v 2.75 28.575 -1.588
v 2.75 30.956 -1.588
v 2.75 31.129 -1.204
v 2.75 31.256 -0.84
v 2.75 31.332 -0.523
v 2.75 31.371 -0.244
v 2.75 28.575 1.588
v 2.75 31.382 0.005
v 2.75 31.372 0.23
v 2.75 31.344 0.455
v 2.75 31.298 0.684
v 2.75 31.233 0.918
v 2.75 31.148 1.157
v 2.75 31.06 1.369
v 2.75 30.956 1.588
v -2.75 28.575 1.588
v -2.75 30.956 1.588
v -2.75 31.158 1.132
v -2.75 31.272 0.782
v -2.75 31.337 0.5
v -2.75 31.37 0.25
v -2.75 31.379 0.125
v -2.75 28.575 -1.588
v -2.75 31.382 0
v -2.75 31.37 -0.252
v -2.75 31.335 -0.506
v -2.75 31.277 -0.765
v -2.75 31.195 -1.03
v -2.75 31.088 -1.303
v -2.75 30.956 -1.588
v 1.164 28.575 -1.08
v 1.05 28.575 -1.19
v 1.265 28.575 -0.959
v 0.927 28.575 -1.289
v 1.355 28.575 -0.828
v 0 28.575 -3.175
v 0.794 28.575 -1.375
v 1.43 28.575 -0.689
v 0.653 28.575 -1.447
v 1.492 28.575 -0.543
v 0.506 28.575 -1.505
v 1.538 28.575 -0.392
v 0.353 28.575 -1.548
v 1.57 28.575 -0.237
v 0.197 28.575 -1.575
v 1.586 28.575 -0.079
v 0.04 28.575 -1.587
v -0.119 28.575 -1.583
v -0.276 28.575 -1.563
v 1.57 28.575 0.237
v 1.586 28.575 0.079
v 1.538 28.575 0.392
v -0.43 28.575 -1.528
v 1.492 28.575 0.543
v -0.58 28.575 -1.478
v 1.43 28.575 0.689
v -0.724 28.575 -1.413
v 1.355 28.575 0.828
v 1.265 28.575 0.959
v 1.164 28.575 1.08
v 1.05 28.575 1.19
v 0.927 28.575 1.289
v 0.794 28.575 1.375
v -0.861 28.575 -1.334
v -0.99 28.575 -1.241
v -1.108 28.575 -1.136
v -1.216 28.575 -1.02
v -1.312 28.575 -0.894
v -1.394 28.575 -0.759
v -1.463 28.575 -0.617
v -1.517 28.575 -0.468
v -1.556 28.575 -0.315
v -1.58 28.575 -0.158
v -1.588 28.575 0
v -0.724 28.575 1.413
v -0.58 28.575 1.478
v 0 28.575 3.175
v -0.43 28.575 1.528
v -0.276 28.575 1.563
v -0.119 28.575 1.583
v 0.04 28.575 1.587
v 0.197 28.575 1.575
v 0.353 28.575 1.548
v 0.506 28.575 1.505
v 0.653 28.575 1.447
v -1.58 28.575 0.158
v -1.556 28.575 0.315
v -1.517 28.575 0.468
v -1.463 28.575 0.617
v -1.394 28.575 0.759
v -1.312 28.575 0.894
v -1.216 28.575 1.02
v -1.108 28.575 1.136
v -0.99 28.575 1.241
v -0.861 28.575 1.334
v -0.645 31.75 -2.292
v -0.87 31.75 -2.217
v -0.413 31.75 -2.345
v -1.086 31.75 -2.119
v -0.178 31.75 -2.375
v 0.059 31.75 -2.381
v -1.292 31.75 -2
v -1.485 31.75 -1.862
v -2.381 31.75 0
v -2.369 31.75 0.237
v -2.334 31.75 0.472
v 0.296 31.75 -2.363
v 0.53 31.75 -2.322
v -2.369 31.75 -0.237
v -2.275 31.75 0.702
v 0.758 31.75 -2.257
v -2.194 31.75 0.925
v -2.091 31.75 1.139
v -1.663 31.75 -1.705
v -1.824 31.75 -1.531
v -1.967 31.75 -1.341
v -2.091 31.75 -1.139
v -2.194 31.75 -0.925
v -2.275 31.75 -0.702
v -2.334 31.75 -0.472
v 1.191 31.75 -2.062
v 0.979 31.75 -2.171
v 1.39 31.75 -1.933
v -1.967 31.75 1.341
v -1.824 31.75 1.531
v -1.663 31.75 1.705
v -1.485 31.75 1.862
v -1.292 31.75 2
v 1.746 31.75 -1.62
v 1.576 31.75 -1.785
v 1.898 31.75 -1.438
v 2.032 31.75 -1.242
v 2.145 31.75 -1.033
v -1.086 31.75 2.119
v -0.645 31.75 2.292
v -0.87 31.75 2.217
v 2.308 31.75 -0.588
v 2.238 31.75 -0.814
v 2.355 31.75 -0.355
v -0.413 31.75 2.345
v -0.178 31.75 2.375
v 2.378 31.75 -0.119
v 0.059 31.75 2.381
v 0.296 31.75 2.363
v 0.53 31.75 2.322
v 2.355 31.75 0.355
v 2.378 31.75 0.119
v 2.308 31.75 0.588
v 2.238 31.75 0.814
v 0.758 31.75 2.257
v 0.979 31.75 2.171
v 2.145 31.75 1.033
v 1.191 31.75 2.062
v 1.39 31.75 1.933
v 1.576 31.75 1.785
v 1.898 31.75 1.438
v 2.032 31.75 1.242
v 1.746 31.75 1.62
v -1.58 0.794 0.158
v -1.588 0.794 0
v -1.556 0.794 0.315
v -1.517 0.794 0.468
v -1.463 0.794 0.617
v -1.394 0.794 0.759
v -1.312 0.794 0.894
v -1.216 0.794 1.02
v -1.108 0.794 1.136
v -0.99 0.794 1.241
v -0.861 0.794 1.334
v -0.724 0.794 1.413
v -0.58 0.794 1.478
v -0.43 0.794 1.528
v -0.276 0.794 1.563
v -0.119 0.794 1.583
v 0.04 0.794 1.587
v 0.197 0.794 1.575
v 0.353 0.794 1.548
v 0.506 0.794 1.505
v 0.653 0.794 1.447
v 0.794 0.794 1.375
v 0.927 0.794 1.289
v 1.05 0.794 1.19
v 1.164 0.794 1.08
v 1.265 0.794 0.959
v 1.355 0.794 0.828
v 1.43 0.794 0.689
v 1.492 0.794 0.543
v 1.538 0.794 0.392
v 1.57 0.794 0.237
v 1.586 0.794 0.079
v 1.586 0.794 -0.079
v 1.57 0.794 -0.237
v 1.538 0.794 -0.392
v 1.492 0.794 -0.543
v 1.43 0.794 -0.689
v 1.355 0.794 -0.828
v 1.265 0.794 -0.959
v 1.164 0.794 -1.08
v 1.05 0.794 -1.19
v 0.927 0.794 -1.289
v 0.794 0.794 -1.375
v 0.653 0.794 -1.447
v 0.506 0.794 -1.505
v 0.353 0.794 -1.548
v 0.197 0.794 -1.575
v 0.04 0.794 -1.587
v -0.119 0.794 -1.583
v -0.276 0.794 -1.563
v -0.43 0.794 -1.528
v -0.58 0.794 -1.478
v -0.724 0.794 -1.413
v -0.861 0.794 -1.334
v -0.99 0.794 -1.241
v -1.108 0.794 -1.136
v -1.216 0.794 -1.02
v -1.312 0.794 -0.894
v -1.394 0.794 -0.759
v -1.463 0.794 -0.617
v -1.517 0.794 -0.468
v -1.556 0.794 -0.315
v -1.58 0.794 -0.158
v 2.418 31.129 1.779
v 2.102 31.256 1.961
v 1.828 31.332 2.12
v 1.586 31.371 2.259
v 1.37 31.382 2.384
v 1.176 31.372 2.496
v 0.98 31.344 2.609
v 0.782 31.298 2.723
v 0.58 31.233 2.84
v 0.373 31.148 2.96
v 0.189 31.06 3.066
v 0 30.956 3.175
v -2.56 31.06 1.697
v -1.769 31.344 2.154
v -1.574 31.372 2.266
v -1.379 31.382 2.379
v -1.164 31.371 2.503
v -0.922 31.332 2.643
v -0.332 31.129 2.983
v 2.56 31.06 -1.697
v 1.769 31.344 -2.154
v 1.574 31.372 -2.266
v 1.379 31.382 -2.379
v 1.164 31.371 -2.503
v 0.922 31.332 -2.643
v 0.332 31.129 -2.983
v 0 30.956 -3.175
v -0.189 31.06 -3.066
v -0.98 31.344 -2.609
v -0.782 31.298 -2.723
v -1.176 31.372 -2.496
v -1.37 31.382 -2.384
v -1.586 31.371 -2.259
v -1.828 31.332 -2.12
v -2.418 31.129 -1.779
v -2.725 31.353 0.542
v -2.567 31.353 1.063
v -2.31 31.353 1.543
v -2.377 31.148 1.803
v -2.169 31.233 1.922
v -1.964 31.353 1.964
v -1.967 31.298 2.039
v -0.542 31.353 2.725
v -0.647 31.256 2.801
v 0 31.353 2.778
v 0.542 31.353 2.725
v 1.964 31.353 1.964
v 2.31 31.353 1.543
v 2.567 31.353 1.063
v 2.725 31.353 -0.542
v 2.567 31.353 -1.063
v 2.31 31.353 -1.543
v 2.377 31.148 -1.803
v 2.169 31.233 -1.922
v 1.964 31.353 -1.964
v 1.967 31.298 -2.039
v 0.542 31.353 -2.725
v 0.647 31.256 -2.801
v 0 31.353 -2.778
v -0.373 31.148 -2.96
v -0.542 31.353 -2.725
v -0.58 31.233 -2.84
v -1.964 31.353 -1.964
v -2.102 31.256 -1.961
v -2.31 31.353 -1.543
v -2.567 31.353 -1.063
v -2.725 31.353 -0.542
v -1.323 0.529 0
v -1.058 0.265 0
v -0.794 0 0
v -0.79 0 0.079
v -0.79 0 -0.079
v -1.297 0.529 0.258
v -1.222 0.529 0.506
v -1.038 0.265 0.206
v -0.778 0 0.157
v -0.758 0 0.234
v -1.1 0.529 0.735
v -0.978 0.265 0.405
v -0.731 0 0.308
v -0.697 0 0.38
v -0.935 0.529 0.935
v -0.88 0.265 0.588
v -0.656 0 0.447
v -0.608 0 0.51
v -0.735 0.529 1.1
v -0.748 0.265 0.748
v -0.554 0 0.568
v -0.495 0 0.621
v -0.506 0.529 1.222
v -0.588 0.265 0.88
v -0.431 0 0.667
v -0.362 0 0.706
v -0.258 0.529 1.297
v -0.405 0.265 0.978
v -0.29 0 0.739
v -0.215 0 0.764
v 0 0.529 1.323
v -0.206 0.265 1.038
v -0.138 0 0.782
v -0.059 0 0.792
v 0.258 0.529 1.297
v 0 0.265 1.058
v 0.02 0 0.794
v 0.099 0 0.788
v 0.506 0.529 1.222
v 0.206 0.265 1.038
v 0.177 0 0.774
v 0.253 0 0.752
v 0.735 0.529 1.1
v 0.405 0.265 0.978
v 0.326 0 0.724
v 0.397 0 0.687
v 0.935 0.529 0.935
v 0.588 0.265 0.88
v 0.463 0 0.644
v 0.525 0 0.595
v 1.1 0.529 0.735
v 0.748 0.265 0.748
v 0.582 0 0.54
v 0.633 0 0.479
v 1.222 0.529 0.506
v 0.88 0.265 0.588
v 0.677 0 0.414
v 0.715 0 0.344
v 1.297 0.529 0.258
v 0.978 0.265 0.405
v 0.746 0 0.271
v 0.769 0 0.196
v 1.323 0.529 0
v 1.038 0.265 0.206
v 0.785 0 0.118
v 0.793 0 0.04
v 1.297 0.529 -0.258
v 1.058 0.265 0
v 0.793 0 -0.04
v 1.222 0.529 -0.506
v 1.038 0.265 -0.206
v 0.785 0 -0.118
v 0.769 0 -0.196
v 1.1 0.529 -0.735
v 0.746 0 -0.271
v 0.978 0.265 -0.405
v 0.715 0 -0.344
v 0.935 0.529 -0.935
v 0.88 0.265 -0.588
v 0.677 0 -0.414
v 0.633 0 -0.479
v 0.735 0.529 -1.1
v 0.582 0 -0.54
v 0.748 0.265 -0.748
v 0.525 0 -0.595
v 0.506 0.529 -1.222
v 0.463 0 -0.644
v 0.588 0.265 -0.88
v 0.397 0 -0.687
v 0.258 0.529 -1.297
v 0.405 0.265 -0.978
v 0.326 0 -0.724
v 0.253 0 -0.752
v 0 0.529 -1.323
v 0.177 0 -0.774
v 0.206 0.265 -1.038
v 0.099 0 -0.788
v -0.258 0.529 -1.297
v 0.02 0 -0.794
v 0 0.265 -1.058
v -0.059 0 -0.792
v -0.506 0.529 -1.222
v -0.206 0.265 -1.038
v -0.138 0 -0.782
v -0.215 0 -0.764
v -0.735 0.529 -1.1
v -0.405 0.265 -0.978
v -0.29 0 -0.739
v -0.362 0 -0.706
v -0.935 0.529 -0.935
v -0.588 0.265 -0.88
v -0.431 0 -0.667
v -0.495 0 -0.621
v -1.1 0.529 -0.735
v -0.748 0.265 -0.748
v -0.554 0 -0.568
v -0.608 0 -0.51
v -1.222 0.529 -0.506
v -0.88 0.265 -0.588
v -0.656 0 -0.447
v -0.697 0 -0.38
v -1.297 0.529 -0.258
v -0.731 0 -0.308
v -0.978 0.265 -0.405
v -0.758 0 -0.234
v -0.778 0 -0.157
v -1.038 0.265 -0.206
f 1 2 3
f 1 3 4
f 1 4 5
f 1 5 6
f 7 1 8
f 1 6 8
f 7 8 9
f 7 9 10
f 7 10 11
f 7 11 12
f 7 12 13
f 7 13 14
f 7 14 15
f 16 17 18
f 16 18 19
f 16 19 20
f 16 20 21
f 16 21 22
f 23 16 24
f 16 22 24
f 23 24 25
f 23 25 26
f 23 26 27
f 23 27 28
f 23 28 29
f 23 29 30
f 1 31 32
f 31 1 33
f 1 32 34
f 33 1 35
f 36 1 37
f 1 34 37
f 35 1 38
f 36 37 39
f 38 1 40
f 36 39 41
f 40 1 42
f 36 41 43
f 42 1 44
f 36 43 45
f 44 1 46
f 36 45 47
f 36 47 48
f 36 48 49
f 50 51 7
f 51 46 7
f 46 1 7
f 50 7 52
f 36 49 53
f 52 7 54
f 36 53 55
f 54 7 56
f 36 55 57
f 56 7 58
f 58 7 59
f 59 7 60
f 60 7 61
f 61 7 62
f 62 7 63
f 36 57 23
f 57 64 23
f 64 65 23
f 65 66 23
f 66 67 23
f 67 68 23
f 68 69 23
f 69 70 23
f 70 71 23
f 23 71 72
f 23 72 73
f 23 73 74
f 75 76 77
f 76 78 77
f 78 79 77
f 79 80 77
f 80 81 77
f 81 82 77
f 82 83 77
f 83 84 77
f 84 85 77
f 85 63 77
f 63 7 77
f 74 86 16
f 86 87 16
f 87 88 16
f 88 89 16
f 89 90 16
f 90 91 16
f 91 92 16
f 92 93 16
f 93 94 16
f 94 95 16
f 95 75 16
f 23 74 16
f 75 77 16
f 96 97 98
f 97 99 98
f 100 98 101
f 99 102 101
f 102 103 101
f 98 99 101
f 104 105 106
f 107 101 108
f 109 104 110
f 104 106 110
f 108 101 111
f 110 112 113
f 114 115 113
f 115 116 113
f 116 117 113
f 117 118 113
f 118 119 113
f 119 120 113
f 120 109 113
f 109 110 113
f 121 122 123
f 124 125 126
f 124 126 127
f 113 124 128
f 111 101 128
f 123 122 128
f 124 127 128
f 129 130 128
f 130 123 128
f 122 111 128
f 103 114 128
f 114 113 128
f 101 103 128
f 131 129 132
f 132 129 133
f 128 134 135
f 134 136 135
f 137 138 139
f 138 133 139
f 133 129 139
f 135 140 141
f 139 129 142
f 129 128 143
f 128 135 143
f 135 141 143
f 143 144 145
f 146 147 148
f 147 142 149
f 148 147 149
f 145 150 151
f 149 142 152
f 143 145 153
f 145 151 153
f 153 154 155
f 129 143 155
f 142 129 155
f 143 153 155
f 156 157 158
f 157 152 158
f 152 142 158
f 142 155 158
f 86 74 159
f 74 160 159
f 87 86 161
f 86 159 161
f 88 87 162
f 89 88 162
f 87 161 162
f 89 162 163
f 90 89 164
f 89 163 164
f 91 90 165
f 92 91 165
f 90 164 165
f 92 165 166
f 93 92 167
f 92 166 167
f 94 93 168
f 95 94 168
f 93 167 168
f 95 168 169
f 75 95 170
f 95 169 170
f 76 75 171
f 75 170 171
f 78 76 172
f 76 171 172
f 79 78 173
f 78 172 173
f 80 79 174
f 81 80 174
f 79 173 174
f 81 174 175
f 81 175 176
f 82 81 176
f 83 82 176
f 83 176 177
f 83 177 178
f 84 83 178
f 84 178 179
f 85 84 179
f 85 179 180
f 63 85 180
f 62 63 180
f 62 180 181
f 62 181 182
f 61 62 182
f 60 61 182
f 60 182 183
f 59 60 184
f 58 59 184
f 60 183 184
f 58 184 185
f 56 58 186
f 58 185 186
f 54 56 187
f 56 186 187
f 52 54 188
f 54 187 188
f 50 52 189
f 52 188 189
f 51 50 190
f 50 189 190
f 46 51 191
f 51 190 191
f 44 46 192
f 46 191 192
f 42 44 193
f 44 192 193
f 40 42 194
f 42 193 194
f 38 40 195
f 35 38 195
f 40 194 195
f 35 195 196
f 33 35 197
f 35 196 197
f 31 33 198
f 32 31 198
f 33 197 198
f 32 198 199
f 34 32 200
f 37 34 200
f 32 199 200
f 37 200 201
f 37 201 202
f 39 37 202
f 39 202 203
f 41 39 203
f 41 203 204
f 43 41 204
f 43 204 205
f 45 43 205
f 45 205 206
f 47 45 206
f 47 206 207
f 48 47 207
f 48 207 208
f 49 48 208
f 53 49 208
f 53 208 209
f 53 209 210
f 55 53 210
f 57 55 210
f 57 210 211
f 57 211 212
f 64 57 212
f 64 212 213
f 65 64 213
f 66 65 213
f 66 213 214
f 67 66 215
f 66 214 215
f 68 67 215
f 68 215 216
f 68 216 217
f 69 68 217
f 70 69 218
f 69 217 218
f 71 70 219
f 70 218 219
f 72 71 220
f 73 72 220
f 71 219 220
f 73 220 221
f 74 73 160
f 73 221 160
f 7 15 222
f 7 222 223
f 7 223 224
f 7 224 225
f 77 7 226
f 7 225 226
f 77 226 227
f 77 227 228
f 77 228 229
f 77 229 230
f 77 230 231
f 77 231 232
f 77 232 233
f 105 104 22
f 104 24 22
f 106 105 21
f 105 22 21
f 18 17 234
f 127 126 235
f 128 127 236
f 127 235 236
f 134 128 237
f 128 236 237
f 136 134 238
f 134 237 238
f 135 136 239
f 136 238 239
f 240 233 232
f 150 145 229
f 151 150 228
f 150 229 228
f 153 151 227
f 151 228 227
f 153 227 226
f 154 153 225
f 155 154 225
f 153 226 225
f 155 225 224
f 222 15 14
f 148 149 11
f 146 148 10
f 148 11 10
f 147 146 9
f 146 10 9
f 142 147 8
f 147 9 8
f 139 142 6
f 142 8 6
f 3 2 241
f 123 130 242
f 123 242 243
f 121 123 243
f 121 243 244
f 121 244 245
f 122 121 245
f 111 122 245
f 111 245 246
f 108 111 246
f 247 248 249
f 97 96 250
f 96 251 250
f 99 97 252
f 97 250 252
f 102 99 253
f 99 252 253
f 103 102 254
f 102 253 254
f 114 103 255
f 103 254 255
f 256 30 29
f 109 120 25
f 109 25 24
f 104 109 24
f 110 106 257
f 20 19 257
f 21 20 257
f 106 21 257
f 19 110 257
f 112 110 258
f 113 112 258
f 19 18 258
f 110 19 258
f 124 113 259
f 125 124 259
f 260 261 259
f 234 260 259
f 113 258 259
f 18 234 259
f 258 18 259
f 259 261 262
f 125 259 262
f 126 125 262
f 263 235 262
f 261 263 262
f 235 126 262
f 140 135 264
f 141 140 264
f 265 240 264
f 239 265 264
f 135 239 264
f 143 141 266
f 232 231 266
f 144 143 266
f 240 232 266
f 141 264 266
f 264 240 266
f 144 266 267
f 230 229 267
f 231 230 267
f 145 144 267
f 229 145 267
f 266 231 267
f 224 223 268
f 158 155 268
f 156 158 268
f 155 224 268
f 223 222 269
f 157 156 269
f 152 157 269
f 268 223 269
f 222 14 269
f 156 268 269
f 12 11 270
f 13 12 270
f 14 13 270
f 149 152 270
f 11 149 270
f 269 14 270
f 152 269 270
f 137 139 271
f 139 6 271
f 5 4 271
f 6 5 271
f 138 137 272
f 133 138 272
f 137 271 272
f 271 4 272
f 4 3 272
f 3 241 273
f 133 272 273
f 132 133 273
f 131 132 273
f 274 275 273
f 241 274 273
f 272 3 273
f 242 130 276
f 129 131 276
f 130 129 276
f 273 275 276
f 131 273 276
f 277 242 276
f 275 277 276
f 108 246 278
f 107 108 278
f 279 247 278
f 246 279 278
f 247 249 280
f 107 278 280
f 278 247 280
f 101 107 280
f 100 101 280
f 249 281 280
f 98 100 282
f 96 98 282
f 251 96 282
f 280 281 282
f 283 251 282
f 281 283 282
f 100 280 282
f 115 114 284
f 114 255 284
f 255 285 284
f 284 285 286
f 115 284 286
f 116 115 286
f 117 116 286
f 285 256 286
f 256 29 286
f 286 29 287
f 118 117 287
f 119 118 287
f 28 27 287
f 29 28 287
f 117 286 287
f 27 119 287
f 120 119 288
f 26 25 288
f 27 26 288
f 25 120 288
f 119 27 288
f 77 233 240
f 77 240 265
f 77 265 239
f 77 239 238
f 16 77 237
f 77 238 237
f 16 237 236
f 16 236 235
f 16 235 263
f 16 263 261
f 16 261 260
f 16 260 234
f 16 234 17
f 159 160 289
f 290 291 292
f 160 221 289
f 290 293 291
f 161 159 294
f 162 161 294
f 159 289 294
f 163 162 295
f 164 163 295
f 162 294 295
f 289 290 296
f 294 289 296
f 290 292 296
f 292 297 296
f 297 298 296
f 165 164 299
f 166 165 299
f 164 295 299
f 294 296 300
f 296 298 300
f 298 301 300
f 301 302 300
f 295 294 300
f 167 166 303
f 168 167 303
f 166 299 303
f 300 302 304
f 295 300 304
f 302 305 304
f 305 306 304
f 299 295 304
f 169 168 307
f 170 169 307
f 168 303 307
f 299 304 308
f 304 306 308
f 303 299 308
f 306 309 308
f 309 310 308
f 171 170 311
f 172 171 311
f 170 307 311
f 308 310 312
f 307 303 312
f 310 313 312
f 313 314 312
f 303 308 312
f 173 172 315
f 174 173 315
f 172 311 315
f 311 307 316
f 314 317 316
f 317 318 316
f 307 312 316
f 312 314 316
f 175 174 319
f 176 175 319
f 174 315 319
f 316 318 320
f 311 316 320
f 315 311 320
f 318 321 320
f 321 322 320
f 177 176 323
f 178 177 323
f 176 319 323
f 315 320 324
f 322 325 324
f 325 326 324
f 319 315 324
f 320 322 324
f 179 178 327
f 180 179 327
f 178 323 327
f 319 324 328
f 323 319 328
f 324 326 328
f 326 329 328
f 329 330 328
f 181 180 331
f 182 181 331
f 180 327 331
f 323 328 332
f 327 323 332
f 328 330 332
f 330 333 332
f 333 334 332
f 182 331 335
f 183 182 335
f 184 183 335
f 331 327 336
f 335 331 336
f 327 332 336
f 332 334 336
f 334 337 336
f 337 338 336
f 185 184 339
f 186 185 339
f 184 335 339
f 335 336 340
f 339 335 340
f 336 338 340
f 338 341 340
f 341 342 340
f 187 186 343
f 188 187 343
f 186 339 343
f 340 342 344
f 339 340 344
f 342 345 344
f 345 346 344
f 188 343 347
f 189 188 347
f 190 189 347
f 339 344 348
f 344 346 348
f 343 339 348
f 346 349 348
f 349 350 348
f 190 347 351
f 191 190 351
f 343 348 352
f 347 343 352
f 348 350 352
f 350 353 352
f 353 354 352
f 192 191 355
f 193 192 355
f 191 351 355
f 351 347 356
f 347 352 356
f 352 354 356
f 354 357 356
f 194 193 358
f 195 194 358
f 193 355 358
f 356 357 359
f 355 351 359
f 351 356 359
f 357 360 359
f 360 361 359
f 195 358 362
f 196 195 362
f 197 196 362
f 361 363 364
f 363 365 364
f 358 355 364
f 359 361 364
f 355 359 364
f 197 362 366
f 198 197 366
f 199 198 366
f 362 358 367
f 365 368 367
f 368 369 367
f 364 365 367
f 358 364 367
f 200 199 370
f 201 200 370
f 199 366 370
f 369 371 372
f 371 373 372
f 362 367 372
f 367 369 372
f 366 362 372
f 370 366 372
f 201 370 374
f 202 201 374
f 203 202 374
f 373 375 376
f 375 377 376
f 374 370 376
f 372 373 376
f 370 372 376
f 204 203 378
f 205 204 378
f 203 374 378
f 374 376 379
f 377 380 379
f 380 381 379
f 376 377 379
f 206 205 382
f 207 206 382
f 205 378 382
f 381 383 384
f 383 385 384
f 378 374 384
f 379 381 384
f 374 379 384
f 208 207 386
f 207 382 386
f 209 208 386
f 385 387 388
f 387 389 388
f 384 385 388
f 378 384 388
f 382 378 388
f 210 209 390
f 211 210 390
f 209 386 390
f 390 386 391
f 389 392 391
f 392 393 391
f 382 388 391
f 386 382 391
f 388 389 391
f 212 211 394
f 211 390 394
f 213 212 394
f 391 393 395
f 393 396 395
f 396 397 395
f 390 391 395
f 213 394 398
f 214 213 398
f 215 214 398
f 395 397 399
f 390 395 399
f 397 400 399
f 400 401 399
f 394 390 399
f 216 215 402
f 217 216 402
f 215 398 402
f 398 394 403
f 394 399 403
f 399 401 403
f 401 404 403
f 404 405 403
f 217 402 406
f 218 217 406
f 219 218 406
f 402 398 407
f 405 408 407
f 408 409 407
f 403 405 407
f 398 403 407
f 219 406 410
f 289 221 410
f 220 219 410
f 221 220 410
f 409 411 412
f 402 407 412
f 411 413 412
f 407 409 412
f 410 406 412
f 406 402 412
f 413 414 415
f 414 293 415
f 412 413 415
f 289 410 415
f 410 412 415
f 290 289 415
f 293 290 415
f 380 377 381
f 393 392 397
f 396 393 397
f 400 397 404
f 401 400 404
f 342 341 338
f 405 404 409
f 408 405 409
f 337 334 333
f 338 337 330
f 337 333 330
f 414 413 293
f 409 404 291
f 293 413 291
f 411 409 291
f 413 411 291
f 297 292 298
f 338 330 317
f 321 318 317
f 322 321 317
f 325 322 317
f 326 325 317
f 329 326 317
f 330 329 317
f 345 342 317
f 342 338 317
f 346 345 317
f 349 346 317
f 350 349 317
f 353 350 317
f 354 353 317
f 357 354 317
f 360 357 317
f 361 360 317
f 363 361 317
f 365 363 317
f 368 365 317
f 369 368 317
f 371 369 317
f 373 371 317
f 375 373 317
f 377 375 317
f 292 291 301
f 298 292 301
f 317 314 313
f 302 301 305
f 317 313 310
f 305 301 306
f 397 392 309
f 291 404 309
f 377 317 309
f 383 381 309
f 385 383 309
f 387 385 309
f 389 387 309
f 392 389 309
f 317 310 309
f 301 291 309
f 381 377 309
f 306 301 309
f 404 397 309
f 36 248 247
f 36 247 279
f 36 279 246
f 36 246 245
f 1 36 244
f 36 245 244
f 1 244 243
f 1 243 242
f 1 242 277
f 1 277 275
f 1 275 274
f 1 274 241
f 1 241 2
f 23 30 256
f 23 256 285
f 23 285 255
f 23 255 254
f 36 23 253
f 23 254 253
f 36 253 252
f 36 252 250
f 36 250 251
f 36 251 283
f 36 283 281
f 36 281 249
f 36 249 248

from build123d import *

# Parameters (mm, degrees)
CUT_EXTRUDE1_REACH = 33.75


with BuildPart() as part:
    # Sketch1 → Revolve1 (revolve)
    with BuildSketch(Plane.XY):
        Polygon((0, 31.75), (-2.38125, 31.75), (-3.175, 30.95625), (-3.175, 28.575), (-1.5875, 28.575), (-1.5875, 0.79375), (-0.79375, 0), (0, 0), align=None)
    revolve(axis=Axis((0, 0, 0), (0, 1, 0)))

    # Sketch2 → Cut-Extrude1 (cut, up to next)
    with BuildSketch(Plane(origin=(0, 31.75, 0), x_dir=(1, 0, 0), z_dir=(0, 1, 0)), mode=Mode.PRIVATE) as cut_extrude1_sk1:
        with BuildLine():
            Line((-2.749630657, 1.5875), (0, 3.175))
            ThreePointArc((0, 3.175), (-1.5875, 2.749630657), (-2.749630657, 1.5875))
        make_face()
    cut_extrude1_tool1 = extrude(cut_extrude1_sk1.sketch, amount=-CUT_EXTRUDE1_REACH, mode=Mode.PRIVATE) & part.part
    add(cut_extrude1_tool1.solids().sort_by_distance((-1.460397, 31.75, -2.529482))[0], mode=Mode.SUBTRACT)
    # Sketch2 → Cut-Extrude1 (cut, up to next)
    with BuildSketch(Plane(origin=(0, 31.75, 0), x_dir=(1, 0, 0), z_dir=(0, 1, 0)), mode=Mode.PRIVATE) as cut_extrude1_sk2:
        with BuildLine():
            ThreePointArc((2.749630657, 1.5875), (1.5875, 2.749630657), (0, 3.175))
            Line((0, 3.175), (2.749630657, 1.5875))
        make_face()
    cut_extrude1_tool2 = extrude(cut_extrude1_sk2.sketch, amount=-CUT_EXTRUDE1_REACH, mode=Mode.PRIVATE) & part.part
    add(cut_extrude1_tool2.solids().sort_by_distance((1.460397, 31.75, -2.529482))[0], mode=Mode.SUBTRACT)
    # Sketch2 → Cut-Extrude1 (cut, up to next)
    with BuildSketch(Plane(origin=(0, 31.75, 0), x_dir=(1, 0, 0), z_dir=(0, 1, 0)), mode=Mode.PRIVATE) as cut_extrude1_sk3:
        with BuildLine():
            ThreePointArc((3.175, 0), (3.066814498, 0.821750468), (2.749630657, 1.5875))
            Line((2.749630657, 1.5875), (2.749630657, -1.5875))
            ThreePointArc((2.749630657, -1.5875), (3.066814498, -0.821750468), (3.175, 0))
        make_face()
    cut_extrude1_tool3 = extrude(cut_extrude1_sk3.sketch, amount=-CUT_EXTRUDE1_REACH, mode=Mode.PRIVATE) & part.part
    add(cut_extrude1_tool3.solids().sort_by_distance((2.920795, 31.75, 0))[0], mode=Mode.SUBTRACT)
    # Sketch2 → Cut-Extrude1 (cut, up to next)
    with BuildSketch(Plane(origin=(0, 31.75, 0), x_dir=(1, 0, 0), z_dir=(0, 1, 0)), mode=Mode.PRIVATE) as cut_extrude1_sk4:
        with BuildLine():
            ThreePointArc((0, -3.175), (1.5875, -2.749630657), (2.749630657, -1.5875))
            Line((2.749630657, -1.5875), (0, -3.175))
        make_face()
    cut_extrude1_tool4 = extrude(cut_extrude1_sk4.sketch, amount=-CUT_EXTRUDE1_REACH, mode=Mode.PRIVATE) & part.part
    add(cut_extrude1_tool4.solids().sort_by_distance((1.460397, 31.75, 2.529482))[0], mode=Mode.SUBTRACT)
    # Sketch2 → Cut-Extrude1 (cut, up to next)
    with BuildSketch(Plane(origin=(0, 31.75, 0), x_dir=(1, 0, 0), z_dir=(0, 1, 0)), mode=Mode.PRIVATE) as cut_extrude1_sk5:
        with BuildLine():
            Line((0, -3.175), (-2.749630657, -1.5875))
            ThreePointArc((-2.749630657, -1.5875), (-1.5875, -2.749630657), (0, -3.175))
        make_face()
    cut_extrude1_tool5 = extrude(cut_extrude1_sk5.sketch, amount=-CUT_EXTRUDE1_REACH, mode=Mode.PRIVATE) & part.part
    add(cut_extrude1_tool5.solids().sort_by_distance((-1.460397, 31.75, 2.529482))[0], mode=Mode.SUBTRACT)
    # Sketch2 → Cut-Extrude1 (cut, up to next)
    with BuildSketch(Plane(origin=(0, 31.75, 0), x_dir=(1, 0, 0), z_dir=(0, 1, 0)), mode=Mode.PRIVATE) as cut_extrude1_sk6:
        with BuildLine():
            Line((-2.749630657, -1.5875), (-2.749630657, 1.5875))
            ThreePointArc((-2.749630657, 1.5875), (-3.175, 0), (-2.749630657, -1.5875))
        make_face()
    cut_extrude1_tool6 = extrude(cut_extrude1_sk6.sketch, amount=-CUT_EXTRUDE1_REACH, mode=Mode.PRIVATE) & part.part
    add(cut_extrude1_tool6.solids().sort_by_distance((-2.920795, 31.75, 0))[0], mode=Mode.SUBTRACT)


solid = part.part
